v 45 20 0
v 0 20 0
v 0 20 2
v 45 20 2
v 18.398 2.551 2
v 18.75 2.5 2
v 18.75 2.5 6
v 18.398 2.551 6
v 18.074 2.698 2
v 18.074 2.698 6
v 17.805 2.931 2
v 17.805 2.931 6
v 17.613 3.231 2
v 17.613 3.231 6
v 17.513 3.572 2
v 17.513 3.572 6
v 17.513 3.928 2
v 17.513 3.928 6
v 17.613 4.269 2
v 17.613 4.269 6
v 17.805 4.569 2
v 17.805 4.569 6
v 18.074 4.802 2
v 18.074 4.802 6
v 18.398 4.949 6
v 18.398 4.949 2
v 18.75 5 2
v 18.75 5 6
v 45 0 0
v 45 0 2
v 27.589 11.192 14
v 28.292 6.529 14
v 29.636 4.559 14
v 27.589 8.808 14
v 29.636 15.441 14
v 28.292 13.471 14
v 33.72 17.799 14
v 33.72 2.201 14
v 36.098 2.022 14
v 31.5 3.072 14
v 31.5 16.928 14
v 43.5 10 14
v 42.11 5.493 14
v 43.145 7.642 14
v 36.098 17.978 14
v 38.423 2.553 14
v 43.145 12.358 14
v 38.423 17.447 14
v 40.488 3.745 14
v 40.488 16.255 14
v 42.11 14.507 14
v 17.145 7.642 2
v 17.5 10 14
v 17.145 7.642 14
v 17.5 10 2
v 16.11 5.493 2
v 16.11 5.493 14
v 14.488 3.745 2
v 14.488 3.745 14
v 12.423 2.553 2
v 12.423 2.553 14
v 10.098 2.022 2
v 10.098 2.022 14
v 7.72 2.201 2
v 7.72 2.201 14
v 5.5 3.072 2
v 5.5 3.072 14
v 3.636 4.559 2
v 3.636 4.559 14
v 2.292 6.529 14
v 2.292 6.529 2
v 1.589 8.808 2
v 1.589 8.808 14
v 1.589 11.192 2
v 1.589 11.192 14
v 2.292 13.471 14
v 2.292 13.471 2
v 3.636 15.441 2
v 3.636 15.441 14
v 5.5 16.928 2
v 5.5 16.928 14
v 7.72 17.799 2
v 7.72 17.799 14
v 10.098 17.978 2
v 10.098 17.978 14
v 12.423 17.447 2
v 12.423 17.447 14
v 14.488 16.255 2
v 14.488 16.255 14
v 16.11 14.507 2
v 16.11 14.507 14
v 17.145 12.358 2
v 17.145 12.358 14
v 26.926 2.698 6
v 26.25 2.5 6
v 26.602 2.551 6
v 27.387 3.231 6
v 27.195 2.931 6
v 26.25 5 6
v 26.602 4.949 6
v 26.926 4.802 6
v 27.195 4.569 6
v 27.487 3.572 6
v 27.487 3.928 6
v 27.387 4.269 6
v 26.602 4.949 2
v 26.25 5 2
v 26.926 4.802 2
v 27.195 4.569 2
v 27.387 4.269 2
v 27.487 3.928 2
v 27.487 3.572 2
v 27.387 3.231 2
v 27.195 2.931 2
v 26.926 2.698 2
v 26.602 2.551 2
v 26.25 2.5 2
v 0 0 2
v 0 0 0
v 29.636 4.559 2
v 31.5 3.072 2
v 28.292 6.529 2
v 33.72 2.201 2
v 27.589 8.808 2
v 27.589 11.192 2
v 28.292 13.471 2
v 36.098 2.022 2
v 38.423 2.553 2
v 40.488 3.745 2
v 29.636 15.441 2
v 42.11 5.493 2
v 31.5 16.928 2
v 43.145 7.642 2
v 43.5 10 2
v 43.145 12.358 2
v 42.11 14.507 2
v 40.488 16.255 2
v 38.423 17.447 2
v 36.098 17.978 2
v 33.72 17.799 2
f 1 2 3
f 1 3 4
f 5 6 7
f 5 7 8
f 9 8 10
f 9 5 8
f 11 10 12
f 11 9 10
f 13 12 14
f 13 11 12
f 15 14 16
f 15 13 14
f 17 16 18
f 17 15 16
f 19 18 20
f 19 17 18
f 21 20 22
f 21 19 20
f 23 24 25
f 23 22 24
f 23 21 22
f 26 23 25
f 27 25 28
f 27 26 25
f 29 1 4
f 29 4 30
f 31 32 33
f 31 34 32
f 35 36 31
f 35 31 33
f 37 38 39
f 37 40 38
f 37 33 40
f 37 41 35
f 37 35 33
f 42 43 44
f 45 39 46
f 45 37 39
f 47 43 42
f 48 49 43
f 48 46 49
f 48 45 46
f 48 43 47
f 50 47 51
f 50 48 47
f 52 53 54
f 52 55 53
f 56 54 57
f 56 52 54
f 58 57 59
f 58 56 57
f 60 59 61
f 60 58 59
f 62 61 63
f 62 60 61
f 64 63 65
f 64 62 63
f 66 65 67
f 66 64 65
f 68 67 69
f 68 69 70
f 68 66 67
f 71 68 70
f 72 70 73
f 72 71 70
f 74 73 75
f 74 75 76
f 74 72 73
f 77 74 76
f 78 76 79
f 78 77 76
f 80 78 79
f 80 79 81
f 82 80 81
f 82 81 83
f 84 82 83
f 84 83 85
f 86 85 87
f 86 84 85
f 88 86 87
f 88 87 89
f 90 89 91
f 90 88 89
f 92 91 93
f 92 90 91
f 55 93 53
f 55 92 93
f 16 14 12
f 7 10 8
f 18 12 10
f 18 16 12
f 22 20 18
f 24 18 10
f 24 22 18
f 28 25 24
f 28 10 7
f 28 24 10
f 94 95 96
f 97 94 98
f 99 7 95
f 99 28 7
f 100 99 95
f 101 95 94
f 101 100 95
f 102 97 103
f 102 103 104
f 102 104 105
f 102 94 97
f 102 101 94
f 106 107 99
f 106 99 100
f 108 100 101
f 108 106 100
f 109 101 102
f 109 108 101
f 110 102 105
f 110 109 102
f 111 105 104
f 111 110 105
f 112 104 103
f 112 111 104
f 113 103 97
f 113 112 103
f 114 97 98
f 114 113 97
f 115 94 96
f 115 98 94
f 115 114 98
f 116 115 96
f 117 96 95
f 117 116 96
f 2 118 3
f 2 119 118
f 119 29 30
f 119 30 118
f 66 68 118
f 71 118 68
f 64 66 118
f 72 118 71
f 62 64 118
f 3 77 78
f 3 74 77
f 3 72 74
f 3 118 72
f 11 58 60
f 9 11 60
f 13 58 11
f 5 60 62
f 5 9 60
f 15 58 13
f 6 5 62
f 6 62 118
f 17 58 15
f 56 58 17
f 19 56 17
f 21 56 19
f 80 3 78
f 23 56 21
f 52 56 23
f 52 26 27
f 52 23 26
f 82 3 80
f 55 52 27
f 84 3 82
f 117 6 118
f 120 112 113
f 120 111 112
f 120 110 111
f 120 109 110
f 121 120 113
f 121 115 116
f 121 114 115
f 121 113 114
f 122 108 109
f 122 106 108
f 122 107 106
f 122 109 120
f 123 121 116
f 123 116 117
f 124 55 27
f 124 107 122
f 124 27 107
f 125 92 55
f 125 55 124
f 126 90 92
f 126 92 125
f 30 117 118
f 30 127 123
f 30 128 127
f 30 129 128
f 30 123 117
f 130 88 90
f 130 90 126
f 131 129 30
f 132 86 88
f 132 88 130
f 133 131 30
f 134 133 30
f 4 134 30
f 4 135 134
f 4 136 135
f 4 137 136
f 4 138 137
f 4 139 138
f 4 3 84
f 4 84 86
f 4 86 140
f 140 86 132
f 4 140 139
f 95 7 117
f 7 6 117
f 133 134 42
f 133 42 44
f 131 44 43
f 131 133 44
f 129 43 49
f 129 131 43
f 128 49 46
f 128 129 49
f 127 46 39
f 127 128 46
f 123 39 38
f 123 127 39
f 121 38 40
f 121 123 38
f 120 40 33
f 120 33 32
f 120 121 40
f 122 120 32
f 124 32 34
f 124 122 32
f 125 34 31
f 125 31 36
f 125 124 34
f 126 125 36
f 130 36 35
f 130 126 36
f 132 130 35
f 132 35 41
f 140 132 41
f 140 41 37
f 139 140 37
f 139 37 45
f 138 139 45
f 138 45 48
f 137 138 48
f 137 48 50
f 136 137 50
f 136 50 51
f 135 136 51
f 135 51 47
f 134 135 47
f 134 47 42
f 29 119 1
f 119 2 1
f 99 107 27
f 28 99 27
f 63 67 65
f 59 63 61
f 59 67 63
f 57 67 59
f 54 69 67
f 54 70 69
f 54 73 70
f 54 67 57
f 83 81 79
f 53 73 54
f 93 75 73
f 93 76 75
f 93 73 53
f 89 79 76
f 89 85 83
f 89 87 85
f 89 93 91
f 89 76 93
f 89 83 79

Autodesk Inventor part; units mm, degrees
ref_plane "YZ Plane" through (0, 0, 0) normal (1, 0, 0) x (0, 1, 0)
ref_plane "XZ Plane" through (0, 0, 0) normal (0, 1, 0) x (-1, 0, 0)
ref_plane "XY Plane" through (0, 0, 0) normal (0, 0, 1) x (1, 0, 0)
sketch "Esquisse1" plane through (0, 0, 0) normal (0, 0, 1) x (1, 0, 0)
  line L0 (0, 20) -> (45, 20)
  line L1 (45, 20) -> (45, 0)
  line L2 (45, 0) -> (0, 0)
  line L3 (0, 0) -> (0, 20)
  line L4 (-9, 0) -> (54, 0) projected
  line L5 (0, -4) -> (0, 24) projected
  point P0 (0, 0)
  dimension "d0" = 20
  dimension "d1" = 45
extrude "Extrusion1" add sketch "Esquisse1" along normal blind 2
sketch "Esquisse2" plane through (0, 0, 2) normal (0, 0, 1) x (1, 0, 0)
  circle A0 centre (9.5, 10) radius 8
  circle A1 centre (35.5, 10) radius 8
  line L0 (0, 10) -> (43.5, 10)
  line L1 (45, 20) -> (0, 20) projected
  line L2 (0, 20) -> (0, 0) projected
  dimension "d6" = 16
  dimension "d4" = 10
  dimension "d5" = 16
  dimension "d7" = 26
  dimension "d8" = 9.5
extrude "Extrusion2" add sketch "Esquisse2" along normal blind 12
sketch "Esquisse3" plane through (0, 0, 2) normal (0, 0, 1) x (1, 0, 0)
  line L0 (18.75, 3.75) -> (26.25, 3.75) construction
  line L1 (18.75, 2.5) -> (26.25, 2.5)
  line L2 (26.25, 5) -> (18.75, 5)
  arc A0 (18.75, 5) -> (18.75, 2.5) centre (18.75, 3.75) ccw
  arc A1 (26.25, 2.5) -> (26.25, 5) centre (26.25, 3.75) ccw
  line L3 (45, 0) -> (45, 20) projected
  line L4 (0, 0) -> (45, 0) projected
  point P0 (22.5, 3.75)
  point P1 (27.5, 3.75)
  point P2 (17.5, 3.75)
  dimension "d11" = 10
  dimension "d12" = 2.5
  dimension "d13" = 22.5
  dimension "d14" = 5
extrude "Extrusion3" add sketch "Esquisse3" along normal blind 4
equation "\"d6\" = d5"
properties part number "distance"
